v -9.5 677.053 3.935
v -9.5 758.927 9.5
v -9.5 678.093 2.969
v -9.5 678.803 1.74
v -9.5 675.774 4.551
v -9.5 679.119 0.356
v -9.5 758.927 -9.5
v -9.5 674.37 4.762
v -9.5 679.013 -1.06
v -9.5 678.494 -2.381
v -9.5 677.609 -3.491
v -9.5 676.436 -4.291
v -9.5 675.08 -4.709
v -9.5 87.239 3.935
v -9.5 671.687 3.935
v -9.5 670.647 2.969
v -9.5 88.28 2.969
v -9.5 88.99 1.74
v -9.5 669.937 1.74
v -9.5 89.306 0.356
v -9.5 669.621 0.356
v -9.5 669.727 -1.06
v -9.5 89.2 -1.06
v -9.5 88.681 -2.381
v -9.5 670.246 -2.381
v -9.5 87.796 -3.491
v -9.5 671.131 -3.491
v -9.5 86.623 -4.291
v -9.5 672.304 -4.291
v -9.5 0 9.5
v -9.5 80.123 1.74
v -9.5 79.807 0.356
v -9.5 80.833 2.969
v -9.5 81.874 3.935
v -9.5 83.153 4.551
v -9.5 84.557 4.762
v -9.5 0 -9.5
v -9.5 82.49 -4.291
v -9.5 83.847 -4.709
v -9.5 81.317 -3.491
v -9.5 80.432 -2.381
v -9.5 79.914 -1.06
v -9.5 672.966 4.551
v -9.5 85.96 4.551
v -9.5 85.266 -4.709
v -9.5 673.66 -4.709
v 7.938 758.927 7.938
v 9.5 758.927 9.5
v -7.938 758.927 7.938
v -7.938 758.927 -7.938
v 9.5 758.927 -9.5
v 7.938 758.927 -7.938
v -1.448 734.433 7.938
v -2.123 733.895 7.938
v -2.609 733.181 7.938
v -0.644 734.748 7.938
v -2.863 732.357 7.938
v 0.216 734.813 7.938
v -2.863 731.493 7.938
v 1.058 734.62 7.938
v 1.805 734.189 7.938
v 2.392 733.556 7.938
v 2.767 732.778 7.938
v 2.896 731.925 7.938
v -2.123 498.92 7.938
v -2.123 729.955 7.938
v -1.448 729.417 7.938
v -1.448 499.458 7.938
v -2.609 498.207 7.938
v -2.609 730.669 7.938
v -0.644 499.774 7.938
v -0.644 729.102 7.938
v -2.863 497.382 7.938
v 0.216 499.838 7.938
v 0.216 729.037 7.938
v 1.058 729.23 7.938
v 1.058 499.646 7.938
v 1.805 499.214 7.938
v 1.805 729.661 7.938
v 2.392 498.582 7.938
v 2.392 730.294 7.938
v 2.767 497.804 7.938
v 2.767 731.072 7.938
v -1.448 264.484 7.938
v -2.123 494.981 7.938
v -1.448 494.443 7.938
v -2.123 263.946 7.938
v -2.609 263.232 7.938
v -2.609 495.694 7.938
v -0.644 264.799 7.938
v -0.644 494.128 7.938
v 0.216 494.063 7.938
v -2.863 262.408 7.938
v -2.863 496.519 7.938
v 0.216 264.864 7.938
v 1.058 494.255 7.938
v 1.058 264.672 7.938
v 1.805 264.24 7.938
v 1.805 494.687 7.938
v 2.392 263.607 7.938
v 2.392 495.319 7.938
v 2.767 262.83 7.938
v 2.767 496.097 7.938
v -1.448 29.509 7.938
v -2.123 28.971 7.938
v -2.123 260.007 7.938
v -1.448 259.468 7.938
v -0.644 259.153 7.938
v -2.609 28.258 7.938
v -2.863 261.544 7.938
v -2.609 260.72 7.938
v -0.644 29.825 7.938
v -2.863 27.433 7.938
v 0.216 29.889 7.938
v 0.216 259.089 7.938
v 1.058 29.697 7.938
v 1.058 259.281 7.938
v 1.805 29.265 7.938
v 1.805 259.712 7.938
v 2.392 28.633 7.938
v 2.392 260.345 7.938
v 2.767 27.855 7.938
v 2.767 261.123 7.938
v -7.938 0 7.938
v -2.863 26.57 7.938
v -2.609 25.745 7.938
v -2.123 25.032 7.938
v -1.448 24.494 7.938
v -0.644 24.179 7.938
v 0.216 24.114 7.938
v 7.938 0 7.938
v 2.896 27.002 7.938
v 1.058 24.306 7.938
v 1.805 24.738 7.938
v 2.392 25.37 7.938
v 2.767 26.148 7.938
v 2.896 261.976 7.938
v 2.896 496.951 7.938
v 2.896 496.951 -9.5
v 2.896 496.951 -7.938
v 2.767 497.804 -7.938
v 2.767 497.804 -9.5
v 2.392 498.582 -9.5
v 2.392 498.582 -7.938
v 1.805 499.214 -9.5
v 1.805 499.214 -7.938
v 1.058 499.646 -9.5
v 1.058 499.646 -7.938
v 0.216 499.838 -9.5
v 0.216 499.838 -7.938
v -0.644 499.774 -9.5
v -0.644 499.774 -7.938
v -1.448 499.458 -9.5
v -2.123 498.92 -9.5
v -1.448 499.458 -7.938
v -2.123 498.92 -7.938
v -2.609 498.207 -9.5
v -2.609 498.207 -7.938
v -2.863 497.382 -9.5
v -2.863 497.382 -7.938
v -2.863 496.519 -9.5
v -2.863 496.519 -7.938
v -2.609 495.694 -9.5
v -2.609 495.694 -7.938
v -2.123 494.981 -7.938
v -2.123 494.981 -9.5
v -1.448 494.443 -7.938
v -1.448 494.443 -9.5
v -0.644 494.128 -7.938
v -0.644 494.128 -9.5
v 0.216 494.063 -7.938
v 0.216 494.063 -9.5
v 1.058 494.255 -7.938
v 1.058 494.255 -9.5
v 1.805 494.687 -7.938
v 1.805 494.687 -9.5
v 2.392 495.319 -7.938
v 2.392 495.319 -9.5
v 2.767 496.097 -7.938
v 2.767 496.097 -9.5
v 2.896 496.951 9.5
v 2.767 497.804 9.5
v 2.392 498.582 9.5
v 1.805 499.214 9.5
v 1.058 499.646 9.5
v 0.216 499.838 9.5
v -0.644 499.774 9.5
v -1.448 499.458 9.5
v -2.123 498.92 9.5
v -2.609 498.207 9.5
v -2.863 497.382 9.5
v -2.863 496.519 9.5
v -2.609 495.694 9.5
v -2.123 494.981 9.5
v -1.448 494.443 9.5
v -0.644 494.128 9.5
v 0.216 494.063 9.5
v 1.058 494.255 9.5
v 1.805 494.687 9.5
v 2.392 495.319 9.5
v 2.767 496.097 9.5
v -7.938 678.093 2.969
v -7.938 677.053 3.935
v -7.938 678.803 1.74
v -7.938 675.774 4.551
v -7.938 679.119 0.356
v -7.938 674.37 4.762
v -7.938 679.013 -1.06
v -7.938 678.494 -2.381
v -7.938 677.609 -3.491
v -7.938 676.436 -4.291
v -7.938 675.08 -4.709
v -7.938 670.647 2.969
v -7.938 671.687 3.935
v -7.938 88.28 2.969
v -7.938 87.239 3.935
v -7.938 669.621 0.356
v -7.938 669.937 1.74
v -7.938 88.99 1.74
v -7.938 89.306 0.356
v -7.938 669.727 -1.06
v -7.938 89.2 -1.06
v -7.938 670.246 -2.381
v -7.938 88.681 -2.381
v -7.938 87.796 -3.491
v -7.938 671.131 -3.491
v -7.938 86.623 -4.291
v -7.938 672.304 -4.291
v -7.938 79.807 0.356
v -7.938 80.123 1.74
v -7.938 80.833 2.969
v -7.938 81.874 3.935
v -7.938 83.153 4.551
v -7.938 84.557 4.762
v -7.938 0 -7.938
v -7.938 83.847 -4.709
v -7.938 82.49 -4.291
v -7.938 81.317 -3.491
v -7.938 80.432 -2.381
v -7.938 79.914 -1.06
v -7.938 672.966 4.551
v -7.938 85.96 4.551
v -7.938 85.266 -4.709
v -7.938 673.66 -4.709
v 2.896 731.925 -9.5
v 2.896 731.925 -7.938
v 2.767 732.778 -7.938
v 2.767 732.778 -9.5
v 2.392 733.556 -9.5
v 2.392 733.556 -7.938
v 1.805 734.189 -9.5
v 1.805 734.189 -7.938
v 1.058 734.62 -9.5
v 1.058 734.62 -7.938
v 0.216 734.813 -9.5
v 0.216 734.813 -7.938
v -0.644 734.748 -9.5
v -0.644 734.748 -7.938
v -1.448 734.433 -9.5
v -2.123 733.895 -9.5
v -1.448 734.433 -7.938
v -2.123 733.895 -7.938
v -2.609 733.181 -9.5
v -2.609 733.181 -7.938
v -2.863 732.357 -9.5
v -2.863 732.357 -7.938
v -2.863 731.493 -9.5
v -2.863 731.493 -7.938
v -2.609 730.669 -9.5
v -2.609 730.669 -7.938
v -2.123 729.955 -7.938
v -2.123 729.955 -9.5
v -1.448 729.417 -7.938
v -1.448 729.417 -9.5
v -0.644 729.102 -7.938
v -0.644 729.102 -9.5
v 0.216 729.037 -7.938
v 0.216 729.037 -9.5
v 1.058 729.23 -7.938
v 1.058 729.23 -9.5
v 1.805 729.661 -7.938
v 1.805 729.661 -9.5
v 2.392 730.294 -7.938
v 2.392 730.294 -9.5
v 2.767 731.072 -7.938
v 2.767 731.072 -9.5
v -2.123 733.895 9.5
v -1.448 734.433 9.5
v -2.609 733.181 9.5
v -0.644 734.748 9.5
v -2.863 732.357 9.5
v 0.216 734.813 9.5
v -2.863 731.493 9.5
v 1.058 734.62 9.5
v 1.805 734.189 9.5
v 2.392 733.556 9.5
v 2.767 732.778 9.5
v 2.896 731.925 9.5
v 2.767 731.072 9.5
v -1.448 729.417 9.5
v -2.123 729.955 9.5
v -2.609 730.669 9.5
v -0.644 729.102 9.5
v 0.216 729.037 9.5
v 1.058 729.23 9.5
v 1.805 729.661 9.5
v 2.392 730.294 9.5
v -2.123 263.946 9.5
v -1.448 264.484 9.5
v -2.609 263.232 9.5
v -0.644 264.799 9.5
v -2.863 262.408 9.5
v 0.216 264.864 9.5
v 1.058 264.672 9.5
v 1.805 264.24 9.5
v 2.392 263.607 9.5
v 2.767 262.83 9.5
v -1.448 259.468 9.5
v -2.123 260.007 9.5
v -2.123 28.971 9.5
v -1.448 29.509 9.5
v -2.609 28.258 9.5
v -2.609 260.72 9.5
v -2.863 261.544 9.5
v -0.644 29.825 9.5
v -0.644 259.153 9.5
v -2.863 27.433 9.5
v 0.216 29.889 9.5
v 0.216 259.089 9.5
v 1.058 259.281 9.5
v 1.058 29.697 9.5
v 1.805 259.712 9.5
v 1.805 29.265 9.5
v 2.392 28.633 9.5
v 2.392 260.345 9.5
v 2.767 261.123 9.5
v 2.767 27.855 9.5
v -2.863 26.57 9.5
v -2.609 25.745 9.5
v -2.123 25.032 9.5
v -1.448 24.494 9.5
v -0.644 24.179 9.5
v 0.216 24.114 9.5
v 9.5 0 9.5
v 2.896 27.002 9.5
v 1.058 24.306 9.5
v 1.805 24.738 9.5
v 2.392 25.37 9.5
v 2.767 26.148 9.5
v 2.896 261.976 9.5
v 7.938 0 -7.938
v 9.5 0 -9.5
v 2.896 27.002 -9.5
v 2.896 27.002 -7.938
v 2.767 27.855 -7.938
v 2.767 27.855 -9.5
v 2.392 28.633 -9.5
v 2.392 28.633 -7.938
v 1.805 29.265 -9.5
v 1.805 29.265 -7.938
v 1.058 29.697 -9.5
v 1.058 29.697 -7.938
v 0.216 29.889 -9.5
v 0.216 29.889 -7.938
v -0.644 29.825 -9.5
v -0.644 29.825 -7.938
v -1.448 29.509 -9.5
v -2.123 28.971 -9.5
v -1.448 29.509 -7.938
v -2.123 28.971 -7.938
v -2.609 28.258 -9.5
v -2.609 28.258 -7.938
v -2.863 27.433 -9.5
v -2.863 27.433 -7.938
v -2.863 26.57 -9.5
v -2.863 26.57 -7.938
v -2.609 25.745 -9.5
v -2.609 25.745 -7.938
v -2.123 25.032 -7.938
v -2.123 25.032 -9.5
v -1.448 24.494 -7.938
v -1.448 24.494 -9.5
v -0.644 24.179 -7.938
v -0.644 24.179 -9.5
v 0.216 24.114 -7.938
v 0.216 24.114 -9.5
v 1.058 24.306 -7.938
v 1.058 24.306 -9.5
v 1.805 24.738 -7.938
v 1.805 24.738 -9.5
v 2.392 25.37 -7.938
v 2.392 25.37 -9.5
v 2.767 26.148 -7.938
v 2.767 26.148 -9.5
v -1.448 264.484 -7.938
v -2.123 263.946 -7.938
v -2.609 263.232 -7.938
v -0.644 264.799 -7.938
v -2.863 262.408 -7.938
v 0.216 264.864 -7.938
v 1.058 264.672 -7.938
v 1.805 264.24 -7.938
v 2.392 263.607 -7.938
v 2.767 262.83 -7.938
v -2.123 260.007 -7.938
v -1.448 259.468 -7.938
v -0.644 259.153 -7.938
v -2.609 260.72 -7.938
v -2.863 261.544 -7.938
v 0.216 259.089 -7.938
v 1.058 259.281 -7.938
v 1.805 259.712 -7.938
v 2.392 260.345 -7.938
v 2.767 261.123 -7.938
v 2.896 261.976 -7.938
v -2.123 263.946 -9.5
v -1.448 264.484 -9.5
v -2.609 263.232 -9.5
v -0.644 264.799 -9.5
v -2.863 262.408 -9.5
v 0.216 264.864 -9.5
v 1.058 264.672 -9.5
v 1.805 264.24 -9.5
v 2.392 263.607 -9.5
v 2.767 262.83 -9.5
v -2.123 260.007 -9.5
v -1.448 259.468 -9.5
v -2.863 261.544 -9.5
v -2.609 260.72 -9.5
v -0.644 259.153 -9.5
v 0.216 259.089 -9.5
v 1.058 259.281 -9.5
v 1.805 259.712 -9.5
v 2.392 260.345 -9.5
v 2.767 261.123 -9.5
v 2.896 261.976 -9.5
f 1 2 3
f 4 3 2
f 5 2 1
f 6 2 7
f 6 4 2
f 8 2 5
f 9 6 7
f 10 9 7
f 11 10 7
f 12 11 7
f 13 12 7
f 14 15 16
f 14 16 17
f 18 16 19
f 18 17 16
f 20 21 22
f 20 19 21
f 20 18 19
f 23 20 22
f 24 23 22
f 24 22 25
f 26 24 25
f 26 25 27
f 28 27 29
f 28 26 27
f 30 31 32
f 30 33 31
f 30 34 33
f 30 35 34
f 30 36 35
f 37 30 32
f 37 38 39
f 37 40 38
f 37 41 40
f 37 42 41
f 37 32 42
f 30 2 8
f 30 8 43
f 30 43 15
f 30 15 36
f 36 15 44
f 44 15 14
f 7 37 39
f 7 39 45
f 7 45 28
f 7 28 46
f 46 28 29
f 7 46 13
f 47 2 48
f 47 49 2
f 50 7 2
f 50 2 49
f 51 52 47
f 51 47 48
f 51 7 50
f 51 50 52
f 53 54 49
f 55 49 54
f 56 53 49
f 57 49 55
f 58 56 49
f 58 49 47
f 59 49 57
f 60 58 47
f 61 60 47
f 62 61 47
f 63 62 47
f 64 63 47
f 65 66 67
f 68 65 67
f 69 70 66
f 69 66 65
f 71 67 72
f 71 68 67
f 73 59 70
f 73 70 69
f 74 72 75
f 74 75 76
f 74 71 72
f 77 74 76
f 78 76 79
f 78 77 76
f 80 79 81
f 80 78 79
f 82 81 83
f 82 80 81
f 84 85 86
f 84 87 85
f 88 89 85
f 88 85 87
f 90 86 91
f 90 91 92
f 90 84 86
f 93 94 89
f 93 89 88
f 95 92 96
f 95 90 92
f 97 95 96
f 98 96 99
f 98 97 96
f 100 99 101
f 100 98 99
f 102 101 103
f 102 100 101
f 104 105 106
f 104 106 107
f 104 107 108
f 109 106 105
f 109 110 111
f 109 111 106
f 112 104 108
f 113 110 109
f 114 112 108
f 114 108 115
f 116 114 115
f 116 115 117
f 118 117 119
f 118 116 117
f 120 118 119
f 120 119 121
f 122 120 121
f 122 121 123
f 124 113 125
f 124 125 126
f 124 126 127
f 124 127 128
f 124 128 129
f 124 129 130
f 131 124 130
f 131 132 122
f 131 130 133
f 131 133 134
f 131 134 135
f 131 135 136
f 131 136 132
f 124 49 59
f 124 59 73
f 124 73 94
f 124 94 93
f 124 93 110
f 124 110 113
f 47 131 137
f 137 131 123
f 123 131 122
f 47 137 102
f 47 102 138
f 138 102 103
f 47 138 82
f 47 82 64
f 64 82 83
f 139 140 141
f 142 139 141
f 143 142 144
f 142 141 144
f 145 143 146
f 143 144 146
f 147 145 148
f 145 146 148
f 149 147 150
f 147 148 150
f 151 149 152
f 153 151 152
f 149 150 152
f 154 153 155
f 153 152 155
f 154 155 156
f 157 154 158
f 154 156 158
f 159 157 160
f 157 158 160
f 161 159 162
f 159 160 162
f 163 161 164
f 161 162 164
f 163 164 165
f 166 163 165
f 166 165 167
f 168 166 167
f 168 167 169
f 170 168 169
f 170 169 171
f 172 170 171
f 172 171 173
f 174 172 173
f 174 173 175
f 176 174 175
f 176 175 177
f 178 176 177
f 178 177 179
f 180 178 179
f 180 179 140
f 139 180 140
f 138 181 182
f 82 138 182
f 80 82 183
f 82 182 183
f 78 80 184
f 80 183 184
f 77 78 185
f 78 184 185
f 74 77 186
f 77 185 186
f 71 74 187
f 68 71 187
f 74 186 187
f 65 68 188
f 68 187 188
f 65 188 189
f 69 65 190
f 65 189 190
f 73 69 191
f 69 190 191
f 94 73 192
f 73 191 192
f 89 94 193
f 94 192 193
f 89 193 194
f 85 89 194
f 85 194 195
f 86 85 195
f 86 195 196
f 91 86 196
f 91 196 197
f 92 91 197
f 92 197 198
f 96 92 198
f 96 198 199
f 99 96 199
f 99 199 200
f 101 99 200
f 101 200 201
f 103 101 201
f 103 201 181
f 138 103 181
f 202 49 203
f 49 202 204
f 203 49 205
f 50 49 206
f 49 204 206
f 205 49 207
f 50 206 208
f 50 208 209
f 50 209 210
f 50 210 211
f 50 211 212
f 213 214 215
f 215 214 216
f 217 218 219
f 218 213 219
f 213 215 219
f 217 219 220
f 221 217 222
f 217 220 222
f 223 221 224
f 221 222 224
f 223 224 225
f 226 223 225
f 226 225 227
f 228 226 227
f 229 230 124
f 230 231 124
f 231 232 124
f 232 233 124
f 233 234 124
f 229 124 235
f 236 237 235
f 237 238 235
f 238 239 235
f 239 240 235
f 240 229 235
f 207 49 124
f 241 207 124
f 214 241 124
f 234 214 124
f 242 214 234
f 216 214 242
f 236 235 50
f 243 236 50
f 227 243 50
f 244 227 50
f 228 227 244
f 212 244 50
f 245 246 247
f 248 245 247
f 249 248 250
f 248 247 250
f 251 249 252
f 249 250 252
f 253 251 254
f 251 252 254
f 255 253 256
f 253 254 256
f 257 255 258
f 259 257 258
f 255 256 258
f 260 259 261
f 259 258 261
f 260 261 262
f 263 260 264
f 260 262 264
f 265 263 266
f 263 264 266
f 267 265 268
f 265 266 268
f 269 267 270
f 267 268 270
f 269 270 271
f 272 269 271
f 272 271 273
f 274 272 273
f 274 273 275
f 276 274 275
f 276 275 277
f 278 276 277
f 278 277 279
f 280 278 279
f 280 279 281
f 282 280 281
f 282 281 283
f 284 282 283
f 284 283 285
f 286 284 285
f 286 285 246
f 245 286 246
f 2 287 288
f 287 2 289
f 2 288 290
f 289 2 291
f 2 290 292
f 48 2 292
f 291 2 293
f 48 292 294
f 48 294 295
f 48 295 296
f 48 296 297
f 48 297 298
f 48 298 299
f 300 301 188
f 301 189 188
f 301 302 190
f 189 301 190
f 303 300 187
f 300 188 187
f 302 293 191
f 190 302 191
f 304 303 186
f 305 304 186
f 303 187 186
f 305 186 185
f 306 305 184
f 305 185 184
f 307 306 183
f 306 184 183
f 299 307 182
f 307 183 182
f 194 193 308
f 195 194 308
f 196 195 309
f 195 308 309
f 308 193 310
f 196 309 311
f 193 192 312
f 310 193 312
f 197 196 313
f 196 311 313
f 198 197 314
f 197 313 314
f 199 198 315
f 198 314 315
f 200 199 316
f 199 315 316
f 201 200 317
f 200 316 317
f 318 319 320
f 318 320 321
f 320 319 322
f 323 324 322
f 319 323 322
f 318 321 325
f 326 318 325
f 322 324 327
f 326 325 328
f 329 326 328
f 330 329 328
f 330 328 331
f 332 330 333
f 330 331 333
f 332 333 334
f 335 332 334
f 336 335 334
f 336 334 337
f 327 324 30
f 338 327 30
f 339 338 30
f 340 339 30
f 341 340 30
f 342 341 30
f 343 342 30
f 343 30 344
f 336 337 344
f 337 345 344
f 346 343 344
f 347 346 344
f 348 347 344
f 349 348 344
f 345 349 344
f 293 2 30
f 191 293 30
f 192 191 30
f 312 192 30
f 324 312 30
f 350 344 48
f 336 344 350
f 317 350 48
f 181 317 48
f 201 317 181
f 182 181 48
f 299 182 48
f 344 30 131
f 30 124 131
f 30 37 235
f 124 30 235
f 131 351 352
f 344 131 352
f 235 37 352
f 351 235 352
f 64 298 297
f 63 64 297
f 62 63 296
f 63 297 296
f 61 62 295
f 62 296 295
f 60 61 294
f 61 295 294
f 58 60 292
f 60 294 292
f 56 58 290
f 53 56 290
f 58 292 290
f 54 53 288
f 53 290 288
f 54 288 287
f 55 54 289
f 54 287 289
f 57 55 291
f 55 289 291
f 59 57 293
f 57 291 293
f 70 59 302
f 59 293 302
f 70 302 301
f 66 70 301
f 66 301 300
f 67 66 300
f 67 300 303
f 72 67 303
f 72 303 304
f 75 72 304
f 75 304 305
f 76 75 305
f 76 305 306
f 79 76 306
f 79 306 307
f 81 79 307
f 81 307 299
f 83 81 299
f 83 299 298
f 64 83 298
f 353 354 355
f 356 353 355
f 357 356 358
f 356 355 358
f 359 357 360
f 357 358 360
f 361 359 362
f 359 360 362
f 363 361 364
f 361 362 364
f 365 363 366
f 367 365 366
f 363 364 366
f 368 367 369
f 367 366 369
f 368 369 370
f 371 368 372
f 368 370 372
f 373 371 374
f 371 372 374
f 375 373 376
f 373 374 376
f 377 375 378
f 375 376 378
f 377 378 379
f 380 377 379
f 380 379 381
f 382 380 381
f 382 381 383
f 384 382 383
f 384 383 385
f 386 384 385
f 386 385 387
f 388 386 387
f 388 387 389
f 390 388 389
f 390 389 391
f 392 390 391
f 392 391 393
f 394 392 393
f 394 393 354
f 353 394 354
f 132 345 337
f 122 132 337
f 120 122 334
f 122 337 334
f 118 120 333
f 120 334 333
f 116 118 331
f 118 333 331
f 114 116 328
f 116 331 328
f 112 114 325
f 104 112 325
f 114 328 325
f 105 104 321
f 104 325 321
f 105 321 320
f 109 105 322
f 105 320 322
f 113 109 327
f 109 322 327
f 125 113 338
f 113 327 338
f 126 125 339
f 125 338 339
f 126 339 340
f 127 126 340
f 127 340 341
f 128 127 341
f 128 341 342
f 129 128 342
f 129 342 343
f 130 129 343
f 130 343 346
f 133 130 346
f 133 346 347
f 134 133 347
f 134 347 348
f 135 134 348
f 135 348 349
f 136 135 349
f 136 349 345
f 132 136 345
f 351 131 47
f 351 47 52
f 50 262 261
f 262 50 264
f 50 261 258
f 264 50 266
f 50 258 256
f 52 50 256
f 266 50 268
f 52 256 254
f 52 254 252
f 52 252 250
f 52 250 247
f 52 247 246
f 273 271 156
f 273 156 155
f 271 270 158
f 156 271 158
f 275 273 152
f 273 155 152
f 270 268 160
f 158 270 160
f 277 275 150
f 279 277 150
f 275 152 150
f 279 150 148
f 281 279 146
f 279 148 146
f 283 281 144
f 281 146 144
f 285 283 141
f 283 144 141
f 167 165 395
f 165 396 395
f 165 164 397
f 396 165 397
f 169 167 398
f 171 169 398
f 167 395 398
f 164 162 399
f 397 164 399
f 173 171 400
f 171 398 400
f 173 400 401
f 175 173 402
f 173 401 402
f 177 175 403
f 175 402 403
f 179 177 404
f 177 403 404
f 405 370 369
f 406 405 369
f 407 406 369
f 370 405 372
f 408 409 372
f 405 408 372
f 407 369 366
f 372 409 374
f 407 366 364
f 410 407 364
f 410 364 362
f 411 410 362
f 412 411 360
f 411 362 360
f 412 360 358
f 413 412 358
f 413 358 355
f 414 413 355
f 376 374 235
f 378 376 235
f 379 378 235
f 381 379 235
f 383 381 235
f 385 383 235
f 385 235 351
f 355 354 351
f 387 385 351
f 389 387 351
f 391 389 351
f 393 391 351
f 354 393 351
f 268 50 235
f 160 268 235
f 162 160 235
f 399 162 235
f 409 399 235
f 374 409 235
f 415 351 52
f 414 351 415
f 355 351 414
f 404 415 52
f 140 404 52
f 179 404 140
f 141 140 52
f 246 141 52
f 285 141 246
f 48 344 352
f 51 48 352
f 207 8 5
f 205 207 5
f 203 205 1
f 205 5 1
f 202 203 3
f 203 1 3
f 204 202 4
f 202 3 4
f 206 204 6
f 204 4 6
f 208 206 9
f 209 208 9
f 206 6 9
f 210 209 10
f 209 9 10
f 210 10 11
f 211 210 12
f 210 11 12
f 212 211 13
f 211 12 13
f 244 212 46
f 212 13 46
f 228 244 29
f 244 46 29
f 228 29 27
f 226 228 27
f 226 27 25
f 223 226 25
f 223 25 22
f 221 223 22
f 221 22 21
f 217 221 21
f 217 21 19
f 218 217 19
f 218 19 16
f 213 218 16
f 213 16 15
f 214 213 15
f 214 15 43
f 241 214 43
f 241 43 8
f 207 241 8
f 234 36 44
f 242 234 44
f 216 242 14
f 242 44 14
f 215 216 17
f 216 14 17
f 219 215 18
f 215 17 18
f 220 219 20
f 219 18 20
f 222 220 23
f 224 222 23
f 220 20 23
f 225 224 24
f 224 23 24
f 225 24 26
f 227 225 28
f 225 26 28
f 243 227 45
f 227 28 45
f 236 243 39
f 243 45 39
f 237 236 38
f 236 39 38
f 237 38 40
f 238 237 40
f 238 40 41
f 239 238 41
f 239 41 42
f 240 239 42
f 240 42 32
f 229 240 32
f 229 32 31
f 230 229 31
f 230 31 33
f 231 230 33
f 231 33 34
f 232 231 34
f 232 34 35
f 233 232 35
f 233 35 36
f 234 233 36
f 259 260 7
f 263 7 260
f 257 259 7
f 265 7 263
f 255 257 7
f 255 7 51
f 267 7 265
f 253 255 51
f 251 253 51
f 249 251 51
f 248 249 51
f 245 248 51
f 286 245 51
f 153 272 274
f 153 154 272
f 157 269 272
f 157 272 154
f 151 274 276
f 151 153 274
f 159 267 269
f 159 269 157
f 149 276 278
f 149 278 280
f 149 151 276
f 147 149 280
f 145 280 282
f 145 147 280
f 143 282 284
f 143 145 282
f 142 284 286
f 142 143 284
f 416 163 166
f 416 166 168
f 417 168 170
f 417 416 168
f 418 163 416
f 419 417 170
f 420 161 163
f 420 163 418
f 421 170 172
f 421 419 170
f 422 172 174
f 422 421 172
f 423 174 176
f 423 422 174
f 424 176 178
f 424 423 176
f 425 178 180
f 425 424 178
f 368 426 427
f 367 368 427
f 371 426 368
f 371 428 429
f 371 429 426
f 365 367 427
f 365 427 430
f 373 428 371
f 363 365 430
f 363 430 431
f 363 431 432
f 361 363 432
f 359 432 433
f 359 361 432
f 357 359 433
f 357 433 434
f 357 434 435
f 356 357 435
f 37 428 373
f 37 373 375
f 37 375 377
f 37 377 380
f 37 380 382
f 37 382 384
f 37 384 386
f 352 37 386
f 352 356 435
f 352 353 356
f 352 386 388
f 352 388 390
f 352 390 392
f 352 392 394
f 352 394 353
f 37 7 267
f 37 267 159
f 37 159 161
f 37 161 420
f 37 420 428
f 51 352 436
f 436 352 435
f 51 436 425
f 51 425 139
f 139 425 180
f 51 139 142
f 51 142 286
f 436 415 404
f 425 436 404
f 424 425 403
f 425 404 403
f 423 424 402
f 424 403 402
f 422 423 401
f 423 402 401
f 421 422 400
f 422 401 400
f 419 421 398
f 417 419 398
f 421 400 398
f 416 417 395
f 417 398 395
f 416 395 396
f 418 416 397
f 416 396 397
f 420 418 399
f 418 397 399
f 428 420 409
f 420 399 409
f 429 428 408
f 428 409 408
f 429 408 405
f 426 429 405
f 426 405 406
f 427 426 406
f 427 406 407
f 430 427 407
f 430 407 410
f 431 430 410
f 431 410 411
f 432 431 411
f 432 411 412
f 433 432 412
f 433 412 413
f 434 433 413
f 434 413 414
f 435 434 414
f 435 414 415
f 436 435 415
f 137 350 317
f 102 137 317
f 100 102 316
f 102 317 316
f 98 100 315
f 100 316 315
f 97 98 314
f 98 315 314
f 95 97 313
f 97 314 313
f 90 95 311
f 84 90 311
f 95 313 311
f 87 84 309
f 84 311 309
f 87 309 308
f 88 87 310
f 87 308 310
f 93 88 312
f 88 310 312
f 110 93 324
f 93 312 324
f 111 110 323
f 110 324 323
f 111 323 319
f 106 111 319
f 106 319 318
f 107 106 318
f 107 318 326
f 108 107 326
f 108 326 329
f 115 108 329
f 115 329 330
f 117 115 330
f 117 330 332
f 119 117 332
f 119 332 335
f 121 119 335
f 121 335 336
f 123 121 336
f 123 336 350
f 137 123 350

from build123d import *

# Parameters (mm, degrees)
SKETCH1_W                      = 19
SKETCH1_H                      = 19
SKETCH1_W_2                    = 15.875
SKETCH1_H_2                    = 15.875
TUBE_DEPTH                     = 758.9266
SKETCH2_R                      = 2.8956
SIDE_WALL_HOLES_DEPTH          = 20
LPATTERN1_COUNT                = 4
LPATTERN1_PITCH                = 234.974466667
CUT_EXTRUDE1_REACH             = 21
SKETCH3_R                      = 4.7625
CUT_EXTRUDE1_DIRECTION_2_DEPTH = 1


with BuildPart() as part:
    # Sketch1 → Tube (new body)
    with BuildSketch(Plane(origin=(0, 0, 0), x_dir=(1, 0, 0), z_dir=(0, 1, 0))):
        Rectangle(SKETCH1_W, SKETCH1_H)
        Rectangle(SKETCH1_W_2, SKETCH1_H_2, mode=Mode.SUBTRACT)
    extrude(amount=TUBE_DEPTH)

    # Sketch2 → Side Wall Holes (cut, through all)
    with BuildSketch(Plane.XY.offset(9.5)):
        with Locations((0, 731.925)):
            Circle(SKETCH2_R)
    side_wall_holes = extrude(amount=-SIDE_WALL_HOLES_DEPTH, mode=Mode.SUBTRACT)

    # LPattern1: Side Wall Holes ×4
    with Locations(*[(0, -i * LPATTERN1_PITCH, 0) for i in range(1, LPATTERN1_COUNT)]):
        add(side_wall_holes, mode=Mode.SUBTRACT)

    # Sketch3 → Cut-Extrude1 (cut, up to next)
    with BuildSketch(Plane.ZY.offset(9.5), mode=Mode.PRIVATE) as cut_extrude1_sk1:
        with Locations((0, 674.37)):
            Circle(SKETCH3_R)
    cut_extrude1_tool1 = extrude(cut_extrude1_sk1.sketch, amount=-CUT_EXTRUDE1_REACH, mode=Mode.PRIVATE) & part.part
    add(cut_extrude1_tool1.solids().sort_by_distance((-9.5, 674.37, 0))[0], mode=Mode.SUBTRACT)
    # Sketch3 → Cut-Extrude1 (cut, up to next)
    with BuildSketch(Plane.ZY.offset(9.5), mode=Mode.PRIVATE) as cut_extrude1_sk2:
        with Locations((0, 84.5566)):
            Circle(SKETCH3_R)
    cut_extrude1_tool2 = extrude(cut_extrude1_sk2.sketch, amount=-CUT_EXTRUDE1_REACH, mode=Mode.PRIVATE) & part.part
    add(cut_extrude1_tool2.solids().sort_by_distance((-9.5, 84.5566, 0))[0], mode=Mode.SUBTRACT)

    # Sketch3 → Cut-Extrude1 direction 2 (cut)
    with BuildSketch(Plane.ZY.offset(9.5)):
        with Locations((0, 674.37)):
            Circle(SKETCH3_R)
        with Locations((0, 84.5566)):
            Circle(SKETCH3_R)
    extrude(amount=CUT_EXTRUDE1_DIRECTION_2_DEPTH, mode=Mode.SUBTRACT)


solid = part.part
